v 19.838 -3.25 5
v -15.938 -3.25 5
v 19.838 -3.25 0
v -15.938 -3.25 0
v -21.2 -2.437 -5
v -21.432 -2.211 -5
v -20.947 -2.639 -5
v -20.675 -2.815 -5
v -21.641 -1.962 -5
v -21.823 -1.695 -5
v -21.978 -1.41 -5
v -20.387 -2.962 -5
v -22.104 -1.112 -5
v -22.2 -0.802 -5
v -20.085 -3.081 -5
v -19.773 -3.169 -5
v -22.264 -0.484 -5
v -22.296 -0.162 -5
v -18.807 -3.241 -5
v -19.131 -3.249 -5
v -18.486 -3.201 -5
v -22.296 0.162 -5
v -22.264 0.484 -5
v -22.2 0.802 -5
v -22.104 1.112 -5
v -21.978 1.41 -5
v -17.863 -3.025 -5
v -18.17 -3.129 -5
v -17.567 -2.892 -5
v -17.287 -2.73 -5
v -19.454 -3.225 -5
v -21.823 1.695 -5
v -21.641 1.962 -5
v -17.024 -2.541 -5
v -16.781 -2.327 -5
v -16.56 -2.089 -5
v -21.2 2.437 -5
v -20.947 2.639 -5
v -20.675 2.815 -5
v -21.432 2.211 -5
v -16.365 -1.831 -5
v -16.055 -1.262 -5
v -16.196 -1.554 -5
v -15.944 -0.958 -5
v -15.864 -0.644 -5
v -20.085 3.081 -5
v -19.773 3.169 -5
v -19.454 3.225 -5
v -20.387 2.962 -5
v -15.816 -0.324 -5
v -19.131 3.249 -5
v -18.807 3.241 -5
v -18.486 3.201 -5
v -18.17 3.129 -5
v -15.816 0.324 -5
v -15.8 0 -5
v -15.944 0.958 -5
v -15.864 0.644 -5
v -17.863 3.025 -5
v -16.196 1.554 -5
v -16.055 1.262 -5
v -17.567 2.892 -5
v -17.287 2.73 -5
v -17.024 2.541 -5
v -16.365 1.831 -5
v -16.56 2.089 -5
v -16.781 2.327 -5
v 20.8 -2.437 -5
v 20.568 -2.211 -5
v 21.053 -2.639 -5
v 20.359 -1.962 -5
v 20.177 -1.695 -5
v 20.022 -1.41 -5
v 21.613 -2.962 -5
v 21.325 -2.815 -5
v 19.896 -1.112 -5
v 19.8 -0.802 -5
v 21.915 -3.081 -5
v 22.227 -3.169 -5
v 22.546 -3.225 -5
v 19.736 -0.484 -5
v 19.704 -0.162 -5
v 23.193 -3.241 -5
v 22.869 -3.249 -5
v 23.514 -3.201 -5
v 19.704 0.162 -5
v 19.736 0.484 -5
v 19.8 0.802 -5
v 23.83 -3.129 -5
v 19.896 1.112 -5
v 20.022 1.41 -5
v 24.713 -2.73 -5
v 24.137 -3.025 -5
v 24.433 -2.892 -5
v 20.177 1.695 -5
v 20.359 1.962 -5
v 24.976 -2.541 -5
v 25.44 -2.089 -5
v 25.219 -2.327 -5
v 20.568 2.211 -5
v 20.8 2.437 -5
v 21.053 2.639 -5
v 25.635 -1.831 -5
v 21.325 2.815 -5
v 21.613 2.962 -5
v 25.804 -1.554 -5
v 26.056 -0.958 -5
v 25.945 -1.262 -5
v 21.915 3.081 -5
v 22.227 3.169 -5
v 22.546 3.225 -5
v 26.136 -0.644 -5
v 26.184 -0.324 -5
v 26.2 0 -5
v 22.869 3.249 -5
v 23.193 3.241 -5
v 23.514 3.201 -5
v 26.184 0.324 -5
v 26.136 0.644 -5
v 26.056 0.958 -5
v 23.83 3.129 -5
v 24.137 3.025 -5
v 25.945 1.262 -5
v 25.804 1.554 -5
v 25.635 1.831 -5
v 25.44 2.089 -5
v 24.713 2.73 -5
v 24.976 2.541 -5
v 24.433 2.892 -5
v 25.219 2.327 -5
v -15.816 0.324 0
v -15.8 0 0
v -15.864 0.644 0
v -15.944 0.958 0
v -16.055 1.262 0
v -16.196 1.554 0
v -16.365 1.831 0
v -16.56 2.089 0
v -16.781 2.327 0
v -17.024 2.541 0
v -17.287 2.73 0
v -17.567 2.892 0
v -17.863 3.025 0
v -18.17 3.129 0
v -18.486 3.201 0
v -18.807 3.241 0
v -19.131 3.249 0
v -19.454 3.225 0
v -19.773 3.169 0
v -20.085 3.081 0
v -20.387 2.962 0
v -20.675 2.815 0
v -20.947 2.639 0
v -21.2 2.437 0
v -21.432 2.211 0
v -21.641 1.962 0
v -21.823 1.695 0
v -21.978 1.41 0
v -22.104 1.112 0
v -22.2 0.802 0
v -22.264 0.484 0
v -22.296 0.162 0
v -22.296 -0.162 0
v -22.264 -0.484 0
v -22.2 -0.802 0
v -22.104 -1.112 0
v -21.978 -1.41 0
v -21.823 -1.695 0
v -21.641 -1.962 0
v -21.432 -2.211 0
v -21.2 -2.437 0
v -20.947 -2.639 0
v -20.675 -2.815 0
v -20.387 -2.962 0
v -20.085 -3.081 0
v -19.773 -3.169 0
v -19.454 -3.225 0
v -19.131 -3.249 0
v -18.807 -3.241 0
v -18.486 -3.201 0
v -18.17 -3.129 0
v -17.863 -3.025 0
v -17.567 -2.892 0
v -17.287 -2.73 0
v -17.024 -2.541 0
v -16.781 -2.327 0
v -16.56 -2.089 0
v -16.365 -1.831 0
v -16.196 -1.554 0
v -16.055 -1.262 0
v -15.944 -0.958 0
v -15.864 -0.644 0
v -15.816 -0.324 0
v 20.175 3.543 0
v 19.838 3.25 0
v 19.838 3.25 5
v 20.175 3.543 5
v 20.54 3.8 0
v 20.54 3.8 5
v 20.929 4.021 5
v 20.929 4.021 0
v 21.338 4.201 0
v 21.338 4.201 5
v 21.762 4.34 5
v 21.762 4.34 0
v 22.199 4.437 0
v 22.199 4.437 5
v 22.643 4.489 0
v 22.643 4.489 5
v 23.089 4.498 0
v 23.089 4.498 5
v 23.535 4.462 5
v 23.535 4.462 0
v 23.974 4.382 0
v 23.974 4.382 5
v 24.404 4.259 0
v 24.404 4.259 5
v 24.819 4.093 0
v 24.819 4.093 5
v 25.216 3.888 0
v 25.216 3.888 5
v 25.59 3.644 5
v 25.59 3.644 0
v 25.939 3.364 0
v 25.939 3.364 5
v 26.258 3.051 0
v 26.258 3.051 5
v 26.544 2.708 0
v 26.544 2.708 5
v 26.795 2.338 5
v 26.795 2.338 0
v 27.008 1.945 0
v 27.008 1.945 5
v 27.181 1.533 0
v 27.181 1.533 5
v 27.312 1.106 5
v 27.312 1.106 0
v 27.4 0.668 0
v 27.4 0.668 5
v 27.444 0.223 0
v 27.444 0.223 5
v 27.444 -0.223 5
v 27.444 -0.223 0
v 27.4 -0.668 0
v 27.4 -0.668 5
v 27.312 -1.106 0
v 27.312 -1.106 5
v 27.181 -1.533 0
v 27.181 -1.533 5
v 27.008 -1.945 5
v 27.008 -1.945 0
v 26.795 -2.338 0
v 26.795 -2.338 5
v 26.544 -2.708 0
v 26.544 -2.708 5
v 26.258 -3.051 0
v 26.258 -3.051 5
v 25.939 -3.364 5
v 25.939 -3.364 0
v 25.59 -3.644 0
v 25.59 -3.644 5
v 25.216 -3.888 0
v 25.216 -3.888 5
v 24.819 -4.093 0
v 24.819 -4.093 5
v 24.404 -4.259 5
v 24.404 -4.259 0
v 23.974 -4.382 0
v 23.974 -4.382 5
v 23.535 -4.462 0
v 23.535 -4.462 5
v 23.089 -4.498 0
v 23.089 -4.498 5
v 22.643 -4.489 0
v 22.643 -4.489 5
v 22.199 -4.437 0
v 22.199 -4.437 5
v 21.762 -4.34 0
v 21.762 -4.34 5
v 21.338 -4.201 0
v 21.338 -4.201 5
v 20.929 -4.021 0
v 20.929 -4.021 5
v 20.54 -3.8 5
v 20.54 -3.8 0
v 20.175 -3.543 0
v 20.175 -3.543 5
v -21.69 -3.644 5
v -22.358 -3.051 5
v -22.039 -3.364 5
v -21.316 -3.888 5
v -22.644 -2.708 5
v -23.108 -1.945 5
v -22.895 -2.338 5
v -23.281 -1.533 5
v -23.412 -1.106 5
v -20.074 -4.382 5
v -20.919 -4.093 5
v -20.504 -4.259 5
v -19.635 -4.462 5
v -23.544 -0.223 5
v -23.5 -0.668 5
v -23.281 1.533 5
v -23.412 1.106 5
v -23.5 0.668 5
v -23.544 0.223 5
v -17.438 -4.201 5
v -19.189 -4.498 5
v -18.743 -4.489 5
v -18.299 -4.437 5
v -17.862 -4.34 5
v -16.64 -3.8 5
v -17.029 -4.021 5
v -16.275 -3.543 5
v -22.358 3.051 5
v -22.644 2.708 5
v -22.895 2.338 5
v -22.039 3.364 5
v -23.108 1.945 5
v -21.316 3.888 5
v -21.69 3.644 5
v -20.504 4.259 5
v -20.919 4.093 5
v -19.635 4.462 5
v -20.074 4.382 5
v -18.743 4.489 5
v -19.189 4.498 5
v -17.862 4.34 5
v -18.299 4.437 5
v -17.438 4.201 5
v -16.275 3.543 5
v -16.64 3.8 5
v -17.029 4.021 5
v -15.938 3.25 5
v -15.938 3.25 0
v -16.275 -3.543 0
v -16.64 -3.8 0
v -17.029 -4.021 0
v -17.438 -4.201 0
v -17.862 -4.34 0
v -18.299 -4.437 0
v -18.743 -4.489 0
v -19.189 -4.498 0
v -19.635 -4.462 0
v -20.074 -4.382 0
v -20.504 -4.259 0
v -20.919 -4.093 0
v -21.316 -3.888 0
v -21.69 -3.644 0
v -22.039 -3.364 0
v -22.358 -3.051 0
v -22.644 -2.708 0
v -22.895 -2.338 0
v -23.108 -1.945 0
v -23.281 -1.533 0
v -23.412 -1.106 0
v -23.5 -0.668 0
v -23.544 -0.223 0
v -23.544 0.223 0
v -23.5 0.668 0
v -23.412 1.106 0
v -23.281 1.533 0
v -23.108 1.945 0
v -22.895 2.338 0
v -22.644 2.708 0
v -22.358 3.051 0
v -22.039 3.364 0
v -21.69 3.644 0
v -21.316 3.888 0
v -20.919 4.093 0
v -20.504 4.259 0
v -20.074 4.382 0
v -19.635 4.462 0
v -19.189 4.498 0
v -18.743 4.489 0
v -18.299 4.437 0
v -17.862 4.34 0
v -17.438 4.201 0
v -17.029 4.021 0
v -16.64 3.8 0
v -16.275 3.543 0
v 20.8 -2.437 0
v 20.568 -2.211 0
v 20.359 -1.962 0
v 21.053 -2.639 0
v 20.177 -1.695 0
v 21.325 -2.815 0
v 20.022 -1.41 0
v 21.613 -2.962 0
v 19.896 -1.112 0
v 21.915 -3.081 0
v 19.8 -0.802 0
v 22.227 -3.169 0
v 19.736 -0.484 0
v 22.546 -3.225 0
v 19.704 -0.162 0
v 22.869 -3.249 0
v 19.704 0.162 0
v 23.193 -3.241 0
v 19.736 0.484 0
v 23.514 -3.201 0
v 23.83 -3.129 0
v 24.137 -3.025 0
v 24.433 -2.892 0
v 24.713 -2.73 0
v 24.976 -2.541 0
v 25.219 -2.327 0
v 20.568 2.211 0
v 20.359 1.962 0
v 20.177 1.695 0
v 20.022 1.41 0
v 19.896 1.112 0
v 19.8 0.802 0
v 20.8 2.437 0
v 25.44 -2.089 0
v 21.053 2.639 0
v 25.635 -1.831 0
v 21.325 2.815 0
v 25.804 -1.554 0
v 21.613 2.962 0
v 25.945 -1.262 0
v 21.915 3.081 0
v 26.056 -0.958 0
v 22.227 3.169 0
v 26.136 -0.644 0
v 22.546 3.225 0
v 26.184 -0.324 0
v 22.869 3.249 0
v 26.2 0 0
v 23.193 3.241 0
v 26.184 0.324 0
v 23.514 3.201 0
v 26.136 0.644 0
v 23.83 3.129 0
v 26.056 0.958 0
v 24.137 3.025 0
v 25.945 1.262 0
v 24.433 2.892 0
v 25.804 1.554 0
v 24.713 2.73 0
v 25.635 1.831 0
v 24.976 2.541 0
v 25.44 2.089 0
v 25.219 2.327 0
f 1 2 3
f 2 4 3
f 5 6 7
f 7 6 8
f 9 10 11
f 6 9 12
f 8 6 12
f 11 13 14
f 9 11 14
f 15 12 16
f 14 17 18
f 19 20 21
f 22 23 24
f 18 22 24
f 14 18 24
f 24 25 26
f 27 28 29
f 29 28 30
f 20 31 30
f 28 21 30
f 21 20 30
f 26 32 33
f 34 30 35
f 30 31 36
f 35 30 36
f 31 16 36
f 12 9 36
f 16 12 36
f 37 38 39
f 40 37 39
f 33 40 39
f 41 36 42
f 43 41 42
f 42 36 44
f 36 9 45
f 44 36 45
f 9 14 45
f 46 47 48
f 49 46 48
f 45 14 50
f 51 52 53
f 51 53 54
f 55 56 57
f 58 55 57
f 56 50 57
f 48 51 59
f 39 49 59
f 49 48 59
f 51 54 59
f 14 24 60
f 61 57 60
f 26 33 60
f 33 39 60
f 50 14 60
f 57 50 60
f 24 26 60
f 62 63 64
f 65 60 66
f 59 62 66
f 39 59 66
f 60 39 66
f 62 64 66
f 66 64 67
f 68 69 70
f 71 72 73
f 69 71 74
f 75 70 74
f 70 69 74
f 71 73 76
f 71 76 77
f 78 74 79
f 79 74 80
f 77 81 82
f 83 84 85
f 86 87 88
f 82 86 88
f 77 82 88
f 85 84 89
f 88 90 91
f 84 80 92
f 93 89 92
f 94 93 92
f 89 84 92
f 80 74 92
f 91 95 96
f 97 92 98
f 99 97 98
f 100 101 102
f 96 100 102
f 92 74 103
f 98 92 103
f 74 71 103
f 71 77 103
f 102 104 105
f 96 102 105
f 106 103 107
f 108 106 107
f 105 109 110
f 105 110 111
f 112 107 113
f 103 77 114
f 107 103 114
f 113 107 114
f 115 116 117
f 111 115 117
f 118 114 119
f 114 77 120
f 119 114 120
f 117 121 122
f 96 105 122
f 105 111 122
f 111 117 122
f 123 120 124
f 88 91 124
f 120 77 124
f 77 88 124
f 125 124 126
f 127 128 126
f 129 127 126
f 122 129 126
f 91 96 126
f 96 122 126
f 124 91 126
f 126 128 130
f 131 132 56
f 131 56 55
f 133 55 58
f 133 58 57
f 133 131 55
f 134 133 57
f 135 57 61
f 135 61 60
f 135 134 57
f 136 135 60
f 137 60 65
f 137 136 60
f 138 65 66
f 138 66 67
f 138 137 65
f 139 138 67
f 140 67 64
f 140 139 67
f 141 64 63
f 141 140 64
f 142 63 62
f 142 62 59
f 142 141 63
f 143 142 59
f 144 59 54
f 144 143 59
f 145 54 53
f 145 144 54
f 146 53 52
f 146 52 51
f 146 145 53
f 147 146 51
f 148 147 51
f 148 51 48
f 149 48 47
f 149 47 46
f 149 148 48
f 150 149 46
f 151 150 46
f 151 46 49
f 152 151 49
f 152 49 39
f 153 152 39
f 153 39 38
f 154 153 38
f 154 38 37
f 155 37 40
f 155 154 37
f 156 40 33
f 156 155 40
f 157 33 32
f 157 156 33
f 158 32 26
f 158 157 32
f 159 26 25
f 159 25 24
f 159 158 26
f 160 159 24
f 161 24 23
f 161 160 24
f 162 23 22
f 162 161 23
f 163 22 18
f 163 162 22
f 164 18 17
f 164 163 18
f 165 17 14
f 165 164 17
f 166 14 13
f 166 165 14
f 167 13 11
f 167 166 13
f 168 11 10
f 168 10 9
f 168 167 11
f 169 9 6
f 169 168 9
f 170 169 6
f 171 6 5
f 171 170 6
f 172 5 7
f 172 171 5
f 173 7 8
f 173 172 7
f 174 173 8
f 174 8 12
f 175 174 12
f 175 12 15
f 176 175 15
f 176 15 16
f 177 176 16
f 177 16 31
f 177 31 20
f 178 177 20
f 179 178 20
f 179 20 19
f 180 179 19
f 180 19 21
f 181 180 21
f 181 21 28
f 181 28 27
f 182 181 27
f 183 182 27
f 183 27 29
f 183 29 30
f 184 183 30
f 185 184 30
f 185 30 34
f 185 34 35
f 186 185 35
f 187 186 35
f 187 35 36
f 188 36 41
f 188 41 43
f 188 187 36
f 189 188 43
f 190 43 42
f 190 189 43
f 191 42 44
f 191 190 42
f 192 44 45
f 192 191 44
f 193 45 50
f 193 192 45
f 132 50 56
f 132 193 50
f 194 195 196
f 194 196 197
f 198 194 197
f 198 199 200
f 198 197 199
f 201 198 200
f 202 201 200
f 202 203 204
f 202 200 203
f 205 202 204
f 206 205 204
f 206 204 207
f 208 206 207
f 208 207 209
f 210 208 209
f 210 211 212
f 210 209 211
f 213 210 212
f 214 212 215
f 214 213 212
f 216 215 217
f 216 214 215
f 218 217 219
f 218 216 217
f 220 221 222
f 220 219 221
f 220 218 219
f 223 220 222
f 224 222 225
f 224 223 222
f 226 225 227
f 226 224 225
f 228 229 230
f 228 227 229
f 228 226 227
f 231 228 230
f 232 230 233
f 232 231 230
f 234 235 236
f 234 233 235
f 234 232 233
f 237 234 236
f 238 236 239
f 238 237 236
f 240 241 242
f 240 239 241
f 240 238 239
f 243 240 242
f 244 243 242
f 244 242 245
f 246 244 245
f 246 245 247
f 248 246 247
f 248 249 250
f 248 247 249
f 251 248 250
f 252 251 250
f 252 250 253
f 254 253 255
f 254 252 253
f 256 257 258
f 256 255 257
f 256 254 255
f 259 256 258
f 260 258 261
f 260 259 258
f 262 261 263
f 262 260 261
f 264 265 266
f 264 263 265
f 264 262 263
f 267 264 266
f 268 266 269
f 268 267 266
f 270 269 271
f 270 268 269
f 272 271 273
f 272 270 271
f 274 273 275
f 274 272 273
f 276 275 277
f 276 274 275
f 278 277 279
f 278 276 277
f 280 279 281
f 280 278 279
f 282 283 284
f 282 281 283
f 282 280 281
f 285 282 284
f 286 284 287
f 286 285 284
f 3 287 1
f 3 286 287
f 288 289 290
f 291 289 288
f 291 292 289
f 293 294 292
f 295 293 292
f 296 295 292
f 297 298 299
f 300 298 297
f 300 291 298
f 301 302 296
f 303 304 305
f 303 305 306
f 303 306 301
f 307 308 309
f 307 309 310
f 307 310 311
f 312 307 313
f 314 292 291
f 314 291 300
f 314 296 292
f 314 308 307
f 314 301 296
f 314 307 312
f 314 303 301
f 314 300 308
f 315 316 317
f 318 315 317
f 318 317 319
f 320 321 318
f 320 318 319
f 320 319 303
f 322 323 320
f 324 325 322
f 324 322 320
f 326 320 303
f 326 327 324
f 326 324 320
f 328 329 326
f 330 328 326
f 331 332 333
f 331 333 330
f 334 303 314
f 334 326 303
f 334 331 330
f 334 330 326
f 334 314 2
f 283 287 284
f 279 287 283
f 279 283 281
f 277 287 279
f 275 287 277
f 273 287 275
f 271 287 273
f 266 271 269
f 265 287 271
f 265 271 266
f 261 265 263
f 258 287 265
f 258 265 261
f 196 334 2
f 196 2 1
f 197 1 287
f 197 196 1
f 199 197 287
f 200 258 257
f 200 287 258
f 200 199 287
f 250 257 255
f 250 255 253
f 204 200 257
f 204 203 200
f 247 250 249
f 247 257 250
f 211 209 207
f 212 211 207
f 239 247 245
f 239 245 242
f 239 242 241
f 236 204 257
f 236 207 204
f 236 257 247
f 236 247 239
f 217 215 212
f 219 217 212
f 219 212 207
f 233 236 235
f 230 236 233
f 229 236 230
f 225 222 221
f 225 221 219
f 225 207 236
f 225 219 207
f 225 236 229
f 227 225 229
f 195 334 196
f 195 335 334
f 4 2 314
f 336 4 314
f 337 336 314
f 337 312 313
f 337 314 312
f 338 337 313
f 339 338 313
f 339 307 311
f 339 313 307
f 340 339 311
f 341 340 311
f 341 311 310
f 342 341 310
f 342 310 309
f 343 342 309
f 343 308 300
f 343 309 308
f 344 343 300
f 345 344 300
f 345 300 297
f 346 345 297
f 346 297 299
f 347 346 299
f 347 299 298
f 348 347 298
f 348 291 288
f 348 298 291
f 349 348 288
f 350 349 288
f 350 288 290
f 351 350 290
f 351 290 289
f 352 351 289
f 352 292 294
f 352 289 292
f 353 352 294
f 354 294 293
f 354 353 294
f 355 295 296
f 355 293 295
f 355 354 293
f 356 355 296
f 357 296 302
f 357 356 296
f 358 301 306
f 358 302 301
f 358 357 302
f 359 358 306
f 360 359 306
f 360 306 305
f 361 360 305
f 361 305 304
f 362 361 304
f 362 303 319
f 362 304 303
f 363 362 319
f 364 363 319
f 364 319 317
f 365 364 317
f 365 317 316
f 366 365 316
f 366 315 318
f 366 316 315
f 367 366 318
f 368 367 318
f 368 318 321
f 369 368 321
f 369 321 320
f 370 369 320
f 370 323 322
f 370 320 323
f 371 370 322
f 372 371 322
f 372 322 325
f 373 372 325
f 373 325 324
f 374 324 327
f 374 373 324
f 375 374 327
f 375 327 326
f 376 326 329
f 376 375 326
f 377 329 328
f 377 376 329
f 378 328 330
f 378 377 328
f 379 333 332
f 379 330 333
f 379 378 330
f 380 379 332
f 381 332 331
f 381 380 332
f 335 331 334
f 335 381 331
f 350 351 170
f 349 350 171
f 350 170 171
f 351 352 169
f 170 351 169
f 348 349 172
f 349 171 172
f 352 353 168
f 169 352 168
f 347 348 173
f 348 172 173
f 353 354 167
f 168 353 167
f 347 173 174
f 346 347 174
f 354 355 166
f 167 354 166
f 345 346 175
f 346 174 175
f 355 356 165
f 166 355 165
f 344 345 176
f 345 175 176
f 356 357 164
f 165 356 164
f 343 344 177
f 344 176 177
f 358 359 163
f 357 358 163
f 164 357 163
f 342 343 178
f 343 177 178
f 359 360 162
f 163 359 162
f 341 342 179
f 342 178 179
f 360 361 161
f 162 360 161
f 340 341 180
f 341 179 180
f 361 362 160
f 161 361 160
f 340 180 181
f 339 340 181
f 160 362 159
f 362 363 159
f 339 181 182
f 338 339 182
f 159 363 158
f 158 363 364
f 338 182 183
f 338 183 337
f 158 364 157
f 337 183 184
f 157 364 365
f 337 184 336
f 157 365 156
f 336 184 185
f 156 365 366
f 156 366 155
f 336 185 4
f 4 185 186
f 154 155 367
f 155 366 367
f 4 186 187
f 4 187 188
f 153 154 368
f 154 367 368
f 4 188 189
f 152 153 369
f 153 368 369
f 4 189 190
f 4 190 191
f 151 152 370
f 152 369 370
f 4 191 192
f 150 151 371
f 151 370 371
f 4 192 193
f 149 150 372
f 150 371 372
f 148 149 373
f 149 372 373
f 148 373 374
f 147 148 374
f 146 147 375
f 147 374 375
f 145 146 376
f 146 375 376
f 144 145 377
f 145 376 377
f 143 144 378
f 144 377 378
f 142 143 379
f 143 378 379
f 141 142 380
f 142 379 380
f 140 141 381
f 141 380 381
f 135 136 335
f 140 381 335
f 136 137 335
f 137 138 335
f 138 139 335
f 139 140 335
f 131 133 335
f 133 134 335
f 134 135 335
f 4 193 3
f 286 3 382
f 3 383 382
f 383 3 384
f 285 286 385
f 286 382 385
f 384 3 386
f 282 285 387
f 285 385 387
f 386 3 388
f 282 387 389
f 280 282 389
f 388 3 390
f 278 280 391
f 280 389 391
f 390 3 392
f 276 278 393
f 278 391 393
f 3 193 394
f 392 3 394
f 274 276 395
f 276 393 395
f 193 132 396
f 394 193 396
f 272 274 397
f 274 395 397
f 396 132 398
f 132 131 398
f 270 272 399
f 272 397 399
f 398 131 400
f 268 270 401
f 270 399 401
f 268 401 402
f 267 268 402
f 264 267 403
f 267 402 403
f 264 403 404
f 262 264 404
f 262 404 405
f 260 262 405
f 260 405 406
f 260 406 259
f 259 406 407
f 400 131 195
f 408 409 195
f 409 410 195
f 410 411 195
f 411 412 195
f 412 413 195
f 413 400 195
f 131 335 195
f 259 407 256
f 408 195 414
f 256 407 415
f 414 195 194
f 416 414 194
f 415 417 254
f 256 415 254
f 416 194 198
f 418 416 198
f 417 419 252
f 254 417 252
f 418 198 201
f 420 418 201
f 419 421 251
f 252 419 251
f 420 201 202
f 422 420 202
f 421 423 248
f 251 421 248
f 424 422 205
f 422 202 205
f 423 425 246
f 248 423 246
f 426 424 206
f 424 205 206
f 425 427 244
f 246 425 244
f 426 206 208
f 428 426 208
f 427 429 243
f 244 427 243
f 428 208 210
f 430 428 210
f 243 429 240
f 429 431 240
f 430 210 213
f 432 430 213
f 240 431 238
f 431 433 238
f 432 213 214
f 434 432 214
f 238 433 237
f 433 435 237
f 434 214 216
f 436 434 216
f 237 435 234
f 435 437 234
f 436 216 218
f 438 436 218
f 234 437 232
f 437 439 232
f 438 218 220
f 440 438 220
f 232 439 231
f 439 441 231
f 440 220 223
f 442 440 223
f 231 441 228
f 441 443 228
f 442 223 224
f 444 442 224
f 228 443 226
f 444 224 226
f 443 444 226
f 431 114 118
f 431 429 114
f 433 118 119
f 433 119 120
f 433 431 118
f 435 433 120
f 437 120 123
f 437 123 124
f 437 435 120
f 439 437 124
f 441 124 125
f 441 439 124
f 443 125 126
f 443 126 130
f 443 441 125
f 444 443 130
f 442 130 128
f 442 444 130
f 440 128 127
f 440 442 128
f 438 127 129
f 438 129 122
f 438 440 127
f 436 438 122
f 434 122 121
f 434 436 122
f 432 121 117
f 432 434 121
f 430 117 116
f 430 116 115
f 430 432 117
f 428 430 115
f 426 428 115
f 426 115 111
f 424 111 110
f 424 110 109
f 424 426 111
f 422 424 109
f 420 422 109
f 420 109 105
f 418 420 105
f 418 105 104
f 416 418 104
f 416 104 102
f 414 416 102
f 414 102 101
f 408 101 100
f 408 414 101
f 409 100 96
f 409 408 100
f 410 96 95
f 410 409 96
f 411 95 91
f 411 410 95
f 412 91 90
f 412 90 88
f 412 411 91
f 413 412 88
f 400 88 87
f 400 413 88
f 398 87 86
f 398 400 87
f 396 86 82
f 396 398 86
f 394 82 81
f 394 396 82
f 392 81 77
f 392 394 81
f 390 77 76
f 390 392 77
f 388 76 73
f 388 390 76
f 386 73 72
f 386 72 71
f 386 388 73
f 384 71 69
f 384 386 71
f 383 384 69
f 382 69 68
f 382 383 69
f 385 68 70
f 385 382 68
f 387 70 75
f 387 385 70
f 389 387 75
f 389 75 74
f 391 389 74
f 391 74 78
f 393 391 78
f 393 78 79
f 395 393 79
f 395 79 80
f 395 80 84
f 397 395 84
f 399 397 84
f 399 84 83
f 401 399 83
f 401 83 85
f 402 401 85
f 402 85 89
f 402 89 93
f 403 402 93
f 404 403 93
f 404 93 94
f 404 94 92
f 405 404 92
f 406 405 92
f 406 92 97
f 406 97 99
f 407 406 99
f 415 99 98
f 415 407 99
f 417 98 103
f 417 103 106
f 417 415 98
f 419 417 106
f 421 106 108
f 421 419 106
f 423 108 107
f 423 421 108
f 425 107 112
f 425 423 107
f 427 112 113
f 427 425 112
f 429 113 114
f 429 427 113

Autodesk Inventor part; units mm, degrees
ref_plane "YZ Plane" through (0, 0, 0) normal (1, 0, 0) x (0, 1, 0)
ref_plane "XZ Plane" through (0, 0, 0) normal (0, 1, 0) x (-1, 0, 0)
ref_plane "XY Plane" through (0, 0, 0) normal (0, 0, 1) x (1, 0, 0)
sketch "Sketch2" plane through (0, 0, 0) normal (0, 0, 1) x (1, 0, 0)
  circle A0 centre (-19.05, 0) radius 3.25
  line L0 (-15.9375, 3.25) -> (19.8375, 3.25)
  arc A1 (-15.9375, 3.25) -> (-15.9375, -3.25) centre (-19.05, 0) ccw
  arc A2 (19.8375, -3.25) -> (19.8375, 3.25) centre (22.95, 0) ccw
  circle A3 centre (22.95, 0) radius 3.25
  line L1 (-31.7023, 0) -> (39.7352, 0) construction
  line L2 (-15.9375, -3.25) -> (19.8375, -3.25)
  point P0 (0, 0)
  dimension "d4" = 6.5
  dimension "d6" = 9
  dimension "d7" = 6.5
  dimension "d8" = 42
extrude "Extrusion1" add sketch "Sketch2" along normal blind 5 contours A0 | L0 A2 L2 A1 | A3
extrude "Extrusion2" add sketch "Sketch2" against normal blind 5 contours A0 | A3
equation "\"d4\" = R"
equation "\"d6\" = R1"
equation "\"d7\" = width"
equation "\"d0\" = thickness"
equation "\"d2\" = thickness"
equation "\"R\" = 6.5"
equation "\"thickness\" = 5"
equation "\"width\" = 6.5"
equation "\"R1\" = 9"
